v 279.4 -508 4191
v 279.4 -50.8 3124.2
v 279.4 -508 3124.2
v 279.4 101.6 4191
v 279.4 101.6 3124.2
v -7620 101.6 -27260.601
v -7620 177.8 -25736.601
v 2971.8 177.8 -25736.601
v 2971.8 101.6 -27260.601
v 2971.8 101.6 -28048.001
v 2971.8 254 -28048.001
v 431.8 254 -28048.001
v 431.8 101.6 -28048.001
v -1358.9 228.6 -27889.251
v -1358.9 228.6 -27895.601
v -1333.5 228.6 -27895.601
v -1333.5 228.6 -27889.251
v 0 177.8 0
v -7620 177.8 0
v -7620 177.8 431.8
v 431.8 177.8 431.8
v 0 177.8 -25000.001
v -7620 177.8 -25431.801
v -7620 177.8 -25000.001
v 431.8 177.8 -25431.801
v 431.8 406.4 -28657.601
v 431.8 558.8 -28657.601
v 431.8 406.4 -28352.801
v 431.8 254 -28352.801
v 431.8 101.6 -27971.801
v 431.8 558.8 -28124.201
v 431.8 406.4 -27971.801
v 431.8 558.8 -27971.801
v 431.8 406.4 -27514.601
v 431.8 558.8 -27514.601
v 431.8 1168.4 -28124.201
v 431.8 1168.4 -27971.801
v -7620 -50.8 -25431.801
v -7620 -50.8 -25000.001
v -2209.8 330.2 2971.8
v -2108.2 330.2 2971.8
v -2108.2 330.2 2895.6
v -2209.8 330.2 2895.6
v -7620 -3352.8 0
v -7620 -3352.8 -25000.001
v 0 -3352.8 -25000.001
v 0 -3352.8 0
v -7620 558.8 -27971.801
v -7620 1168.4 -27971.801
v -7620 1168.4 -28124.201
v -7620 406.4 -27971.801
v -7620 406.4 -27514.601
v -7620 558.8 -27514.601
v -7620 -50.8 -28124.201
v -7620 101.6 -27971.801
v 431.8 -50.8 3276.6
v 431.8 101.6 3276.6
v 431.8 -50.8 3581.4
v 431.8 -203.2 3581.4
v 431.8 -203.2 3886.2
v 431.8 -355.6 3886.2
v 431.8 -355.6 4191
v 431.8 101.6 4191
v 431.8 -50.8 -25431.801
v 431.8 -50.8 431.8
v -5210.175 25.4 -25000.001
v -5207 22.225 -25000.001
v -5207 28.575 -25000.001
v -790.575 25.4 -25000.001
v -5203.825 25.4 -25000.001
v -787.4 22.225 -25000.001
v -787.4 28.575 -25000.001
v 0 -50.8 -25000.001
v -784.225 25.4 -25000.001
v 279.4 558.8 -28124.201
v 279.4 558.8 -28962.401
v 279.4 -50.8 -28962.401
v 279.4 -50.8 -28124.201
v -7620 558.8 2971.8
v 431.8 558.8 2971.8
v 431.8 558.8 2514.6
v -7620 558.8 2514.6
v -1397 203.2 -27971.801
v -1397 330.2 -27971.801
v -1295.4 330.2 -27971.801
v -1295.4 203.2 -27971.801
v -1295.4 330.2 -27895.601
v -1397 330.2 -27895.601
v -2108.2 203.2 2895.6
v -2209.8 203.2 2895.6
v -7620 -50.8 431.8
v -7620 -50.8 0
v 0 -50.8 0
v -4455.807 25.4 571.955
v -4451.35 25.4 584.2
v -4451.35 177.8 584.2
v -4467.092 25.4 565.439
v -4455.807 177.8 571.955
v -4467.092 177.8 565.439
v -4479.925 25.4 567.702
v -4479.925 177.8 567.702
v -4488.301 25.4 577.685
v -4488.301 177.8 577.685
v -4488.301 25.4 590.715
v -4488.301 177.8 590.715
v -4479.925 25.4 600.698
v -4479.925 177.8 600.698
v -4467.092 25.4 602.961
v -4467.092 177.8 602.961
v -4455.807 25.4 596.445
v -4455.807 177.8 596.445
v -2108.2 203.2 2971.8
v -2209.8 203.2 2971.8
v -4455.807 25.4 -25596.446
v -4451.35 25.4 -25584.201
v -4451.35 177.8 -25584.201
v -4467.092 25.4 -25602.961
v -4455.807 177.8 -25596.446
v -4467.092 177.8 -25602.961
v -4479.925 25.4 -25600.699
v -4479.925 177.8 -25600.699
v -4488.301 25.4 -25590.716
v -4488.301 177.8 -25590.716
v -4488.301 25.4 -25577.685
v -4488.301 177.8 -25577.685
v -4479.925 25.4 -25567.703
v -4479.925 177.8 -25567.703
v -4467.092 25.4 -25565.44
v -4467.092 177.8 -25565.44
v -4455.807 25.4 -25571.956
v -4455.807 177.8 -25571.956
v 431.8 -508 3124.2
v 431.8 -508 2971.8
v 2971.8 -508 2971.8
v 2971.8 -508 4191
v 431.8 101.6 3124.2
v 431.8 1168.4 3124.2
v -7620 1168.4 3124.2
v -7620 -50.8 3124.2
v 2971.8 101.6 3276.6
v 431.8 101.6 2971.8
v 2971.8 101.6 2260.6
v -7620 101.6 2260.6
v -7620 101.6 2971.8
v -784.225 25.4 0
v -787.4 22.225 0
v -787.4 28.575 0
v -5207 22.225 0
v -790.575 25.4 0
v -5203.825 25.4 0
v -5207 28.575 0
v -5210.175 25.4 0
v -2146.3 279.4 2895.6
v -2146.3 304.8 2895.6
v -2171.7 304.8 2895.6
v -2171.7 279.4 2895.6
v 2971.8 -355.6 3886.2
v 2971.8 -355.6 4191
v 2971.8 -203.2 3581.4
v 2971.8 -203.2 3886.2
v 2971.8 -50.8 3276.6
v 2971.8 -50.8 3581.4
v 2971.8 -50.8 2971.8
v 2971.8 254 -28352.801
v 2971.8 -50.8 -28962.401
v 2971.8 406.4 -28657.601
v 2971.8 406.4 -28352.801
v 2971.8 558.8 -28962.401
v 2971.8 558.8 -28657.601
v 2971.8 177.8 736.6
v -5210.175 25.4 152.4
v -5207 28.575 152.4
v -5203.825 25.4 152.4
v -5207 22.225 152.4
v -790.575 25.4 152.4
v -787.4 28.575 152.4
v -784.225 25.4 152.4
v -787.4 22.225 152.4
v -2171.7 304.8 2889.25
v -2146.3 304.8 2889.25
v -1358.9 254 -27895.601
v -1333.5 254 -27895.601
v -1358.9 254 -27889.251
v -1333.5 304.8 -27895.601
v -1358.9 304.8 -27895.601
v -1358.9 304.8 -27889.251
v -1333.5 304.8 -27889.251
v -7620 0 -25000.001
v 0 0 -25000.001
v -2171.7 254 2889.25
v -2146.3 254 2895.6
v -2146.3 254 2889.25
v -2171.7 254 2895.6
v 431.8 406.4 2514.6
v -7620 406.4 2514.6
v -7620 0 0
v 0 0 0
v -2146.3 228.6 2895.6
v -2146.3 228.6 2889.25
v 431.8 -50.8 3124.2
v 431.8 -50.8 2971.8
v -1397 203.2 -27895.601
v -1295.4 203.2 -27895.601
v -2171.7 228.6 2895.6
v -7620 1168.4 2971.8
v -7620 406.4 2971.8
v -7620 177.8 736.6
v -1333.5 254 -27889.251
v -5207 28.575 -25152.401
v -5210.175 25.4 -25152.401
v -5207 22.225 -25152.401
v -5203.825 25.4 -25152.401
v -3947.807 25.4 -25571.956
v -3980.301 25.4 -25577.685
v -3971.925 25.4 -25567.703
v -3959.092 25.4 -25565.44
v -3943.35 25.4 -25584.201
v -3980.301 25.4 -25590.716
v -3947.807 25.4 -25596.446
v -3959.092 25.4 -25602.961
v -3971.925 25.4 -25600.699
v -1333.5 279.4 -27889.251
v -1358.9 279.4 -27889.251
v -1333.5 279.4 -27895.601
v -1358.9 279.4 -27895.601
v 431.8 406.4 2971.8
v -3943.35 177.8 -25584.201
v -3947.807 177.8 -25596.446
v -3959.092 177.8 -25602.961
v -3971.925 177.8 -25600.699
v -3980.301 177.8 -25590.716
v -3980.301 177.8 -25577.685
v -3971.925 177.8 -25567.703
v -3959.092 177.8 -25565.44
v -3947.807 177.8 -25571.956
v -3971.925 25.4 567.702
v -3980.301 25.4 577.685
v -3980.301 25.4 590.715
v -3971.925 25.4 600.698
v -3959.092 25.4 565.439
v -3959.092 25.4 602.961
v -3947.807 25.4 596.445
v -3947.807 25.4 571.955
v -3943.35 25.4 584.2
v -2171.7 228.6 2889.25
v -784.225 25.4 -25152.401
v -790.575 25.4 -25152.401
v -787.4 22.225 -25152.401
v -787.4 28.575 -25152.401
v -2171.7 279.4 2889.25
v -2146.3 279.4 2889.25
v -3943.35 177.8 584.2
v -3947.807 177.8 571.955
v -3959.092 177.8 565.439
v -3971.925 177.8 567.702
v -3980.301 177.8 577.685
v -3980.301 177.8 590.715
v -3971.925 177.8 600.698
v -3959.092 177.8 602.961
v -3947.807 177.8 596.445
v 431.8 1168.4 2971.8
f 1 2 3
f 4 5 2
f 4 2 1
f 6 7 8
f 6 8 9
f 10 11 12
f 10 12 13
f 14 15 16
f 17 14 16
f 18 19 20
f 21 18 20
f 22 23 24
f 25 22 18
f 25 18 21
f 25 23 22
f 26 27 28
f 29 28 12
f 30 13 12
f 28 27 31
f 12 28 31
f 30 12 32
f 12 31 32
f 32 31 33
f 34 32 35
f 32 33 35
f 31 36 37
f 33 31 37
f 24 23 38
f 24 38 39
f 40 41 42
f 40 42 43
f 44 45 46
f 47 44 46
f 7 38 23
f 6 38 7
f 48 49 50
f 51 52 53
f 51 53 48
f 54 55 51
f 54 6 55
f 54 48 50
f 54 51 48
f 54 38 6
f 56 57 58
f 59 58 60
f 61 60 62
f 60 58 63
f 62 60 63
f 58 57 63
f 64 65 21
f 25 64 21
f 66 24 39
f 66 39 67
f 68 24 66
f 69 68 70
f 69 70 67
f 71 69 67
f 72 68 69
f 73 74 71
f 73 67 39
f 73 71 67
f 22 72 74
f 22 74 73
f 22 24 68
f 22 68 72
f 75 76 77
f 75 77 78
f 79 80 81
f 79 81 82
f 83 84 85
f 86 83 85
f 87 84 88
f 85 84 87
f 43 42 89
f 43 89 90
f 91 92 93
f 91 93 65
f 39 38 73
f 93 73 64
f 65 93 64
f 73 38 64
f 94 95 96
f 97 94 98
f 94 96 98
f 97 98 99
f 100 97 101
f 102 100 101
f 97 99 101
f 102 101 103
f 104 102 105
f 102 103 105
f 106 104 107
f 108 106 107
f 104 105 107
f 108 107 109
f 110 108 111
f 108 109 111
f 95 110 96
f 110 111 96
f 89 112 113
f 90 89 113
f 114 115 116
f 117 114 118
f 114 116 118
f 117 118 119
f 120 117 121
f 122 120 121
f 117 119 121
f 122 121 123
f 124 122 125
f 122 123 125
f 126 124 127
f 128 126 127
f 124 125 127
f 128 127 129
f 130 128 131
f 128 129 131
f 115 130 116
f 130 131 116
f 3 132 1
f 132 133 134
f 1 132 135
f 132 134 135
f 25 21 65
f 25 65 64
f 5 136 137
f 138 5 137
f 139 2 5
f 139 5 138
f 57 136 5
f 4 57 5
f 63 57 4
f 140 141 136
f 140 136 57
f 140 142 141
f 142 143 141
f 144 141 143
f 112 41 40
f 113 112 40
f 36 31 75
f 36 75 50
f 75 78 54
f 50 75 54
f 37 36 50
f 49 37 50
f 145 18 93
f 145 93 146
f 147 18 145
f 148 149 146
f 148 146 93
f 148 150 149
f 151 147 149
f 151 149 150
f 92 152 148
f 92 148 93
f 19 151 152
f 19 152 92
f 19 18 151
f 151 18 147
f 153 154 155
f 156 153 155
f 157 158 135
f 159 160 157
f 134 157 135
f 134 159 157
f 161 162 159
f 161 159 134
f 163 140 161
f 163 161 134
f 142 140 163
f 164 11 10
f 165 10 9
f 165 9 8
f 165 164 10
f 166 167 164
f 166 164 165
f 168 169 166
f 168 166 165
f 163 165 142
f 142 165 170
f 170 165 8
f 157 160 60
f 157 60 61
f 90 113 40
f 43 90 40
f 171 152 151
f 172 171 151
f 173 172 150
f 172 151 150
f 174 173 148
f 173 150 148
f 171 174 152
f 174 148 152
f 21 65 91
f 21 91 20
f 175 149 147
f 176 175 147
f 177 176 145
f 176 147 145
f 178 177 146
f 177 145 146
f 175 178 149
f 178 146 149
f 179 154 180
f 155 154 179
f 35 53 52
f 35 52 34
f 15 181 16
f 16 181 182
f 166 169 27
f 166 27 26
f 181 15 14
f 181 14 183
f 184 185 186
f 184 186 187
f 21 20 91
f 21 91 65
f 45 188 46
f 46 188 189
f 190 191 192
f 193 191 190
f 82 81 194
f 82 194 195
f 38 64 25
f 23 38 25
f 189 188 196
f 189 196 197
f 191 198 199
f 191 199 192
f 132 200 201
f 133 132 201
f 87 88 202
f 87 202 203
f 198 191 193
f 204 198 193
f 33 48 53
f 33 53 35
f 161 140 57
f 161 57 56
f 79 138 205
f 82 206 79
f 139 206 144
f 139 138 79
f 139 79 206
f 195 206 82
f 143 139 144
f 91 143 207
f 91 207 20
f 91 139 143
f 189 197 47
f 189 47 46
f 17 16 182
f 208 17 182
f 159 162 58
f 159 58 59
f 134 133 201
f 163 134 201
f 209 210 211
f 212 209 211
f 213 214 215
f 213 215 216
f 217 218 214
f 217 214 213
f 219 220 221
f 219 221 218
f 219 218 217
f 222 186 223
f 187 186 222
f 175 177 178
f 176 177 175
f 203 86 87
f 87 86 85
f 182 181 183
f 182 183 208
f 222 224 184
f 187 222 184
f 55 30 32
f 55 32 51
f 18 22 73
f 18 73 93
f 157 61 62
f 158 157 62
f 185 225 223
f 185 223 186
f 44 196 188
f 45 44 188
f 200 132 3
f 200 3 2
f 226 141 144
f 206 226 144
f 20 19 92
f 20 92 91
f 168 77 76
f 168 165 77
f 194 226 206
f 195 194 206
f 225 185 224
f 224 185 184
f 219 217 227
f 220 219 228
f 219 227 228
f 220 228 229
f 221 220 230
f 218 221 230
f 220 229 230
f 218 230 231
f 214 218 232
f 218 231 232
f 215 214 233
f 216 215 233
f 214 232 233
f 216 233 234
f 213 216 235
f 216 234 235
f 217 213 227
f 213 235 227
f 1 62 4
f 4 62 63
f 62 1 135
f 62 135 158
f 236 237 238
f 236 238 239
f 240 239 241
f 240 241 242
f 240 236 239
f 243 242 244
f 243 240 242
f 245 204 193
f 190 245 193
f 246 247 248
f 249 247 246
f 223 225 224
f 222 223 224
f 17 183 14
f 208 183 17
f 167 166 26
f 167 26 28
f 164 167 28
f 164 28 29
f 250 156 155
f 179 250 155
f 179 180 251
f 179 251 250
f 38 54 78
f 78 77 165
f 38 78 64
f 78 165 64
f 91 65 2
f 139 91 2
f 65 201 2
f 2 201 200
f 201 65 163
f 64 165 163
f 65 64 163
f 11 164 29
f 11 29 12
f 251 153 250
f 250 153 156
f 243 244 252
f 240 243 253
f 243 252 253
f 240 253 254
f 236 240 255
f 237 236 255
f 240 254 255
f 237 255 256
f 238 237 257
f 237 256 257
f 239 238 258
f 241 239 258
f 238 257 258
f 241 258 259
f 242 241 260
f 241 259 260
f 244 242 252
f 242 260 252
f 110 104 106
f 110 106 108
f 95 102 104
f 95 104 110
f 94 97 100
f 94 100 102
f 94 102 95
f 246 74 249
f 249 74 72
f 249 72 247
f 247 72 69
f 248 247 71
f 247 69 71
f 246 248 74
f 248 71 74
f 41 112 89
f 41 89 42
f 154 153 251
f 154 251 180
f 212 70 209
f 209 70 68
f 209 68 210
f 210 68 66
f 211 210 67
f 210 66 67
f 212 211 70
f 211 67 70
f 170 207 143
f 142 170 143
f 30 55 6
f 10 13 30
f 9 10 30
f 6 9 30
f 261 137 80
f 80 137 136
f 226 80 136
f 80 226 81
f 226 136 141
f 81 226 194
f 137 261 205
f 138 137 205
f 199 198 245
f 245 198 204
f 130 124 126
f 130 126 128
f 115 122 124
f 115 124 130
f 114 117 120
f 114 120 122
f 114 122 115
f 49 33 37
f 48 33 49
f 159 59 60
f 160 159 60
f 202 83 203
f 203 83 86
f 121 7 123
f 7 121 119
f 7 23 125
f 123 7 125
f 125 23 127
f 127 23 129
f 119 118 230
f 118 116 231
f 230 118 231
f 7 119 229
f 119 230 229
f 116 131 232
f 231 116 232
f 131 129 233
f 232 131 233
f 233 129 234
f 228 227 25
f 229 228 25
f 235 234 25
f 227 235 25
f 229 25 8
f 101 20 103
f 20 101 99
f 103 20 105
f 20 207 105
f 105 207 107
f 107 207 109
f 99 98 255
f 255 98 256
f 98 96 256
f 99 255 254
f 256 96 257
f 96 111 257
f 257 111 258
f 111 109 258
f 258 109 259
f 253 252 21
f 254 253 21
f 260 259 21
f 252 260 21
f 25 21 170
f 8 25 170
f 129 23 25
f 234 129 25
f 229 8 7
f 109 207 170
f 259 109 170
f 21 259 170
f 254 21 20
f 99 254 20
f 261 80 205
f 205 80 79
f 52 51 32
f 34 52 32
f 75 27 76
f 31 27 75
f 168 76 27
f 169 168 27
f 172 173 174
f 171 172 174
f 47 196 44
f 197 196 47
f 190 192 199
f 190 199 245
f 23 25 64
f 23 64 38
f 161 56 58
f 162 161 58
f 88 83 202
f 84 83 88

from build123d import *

# Parameters (mm, degrees)
SKETCH1_W                         = 7620
SKETCH1_H                         = 25000.0008
POOL_WATER_DEPTH                  = 3352.8
POOL_DECK_SUPPORT_DEPTH           = 101.6
POOL_DECK_SUPPORT_DEPTH_BACK      = 76.2
POOL_DECK_DEPTH                   = 152.4
SKETCH4_W                         = 8051.8
SKETCH4_H                         = 152.4
WALL_DEPTH                        = 1219.2
WALL_2_DEPTH                      = 1219.2
SKETCH7_W                         = 8051.8
SKETCH7_H                         = 152.4
NEAR_SIDE_BENCH_DEPTH             = 457.2
SKETCH8_W                         = 8051.8
SKETCH8_H                         = 152.4
FAR_SIDE_BENCH_DEPTH              = 457.2
STAIRS_DOWN_DEPTH                 = 2540
SLOPED_START                      = -8051.8
SLOPED_POOL_DECK_NEAR_SIDE_DEPTH  = 10591.8
SLOPED_POOL_DECK_FAR_SIDE_DEPTH   = 10591.8
SLOPED_POOL_DECK_LENGTH_DEPTH     = 25863.6008
DRAIN_CORRECTION_DEPTH            = 3455.4
STAIRS_UP_DEPTH                   = 2540
PERIMETER_DRAIN_DEPTH             = 228.6
SKETCH23_R                        = 3.175
FAR_SIDE_SWIM_LANE_EYELETS_DEPTH  = 152.4
SKETCH25_R                        = 3.175
NEAR_SIDE_SWIM_LANE_EYELETS_DEPTH = 152.4
SKETCH26_W                        = 838.2
SKETCH26_H                        = 609.6
FAR_SIDE_STAIRS_WALL_DEPTH        = 152.4
SKETCH27_W                        = 1066.8
SKETCH27_H                        = 609.6
NEAR_SIDE_STAIRS_WALL_DEPTH       = 152.4
SKETCH28_W                        = 101.6
SKETCH28_H                        = 127
FAR_SIDE_ELECTRICAL_BOX_DEPTH     = 76.2
SKETCH29_W                        = 25.4
SKETCH29_H                        = 25.4
FAR_SIDE_OUTLETS_DEPTH            = 6.35
FAR_SIDE_OUTLETS_2_DEPTH          = 6.35
SKETCH30_W                        = 101.6
SKETCH30_H                        = 127
NEAR_SIDE_ELECTRICAL_BOX_DEPTH    = 76.2
SKETCH31_W                        = 25.4
SKETCH31_H                        = 25.4
NEAR_SIDE_OUTLETS_DEPTH           = 6.35
NEAR_SIDE_OUTLETS_2_DEPTH         = 6.35
SKETCH32_R                        = 19.05
CUT_EXTRUDE4_DEPTH                = 152.4


with BuildPart() as part:
    # Sketch1 → Pool Water (new body)
    with BuildSketch(Plane(origin=(0, 0, 0), x_dir=(1, 0, 0), z_dir=(0, 1, 0))):
        with Locations((-3810, 12500.0004)):
            Rectangle(SKETCH1_W, SKETCH1_H)
    extrude(amount=-POOL_WATER_DEPTH)


with BuildPart() as body_2:
    # Sketch2 → Pool Deck Support (new body, two sides)
    with BuildSketch(Plane(origin=(0, 0, 0), x_dir=(1, 0, 0), z_dir=(0, 1, 0))) as pool_deck_support_sk:
        Polygon((-7620, 0), (-7620, -431.8), (431.8, -431.8), (431.8, 25431.8008), (-7620, 25431.8008), (-7620, 25000.0008), (0, 25000.0008), (0, 0), align=None)
    extrude(amount=POOL_DECK_SUPPORT_DEPTH)
    extrude(pool_deck_support_sk.sketch, amount=-POOL_DECK_SUPPORT_DEPTH_BACK)



with BuildPart() as body_3:
    # Sketch3 → Pool Deck (new body)
    with BuildSketch(Plane(origin=(0, 101.6, 0), x_dir=(1, 0, 0), z_dir=(0, 1, 0))):
        Polygon((-7620, -2971.8), (-7620, -431.8), (431.8, -431.8), (431.8, 25431.8008), (-7620, 25431.8008), (-7620, 27971.8008), (2971.8, 27971.8008), (2971.8, -2971.8), align=None)
    extrude(amount=-POOL_DECK_DEPTH)



with BuildPart() as body_4:
    # Sketch4 → Wall (new body)
    with BuildSketch(Plane(origin=(0, -50.8, 0), x_dir=(-1, 0, 0), z_dir=(0, -1, 0))):
        with Locations((3594.1, -3048)):
            Rectangle(SKETCH4_W, SKETCH4_H)
    extrude(amount=-WALL_DEPTH)

    # Sketch7 → Near Side Bench (add)
    with BuildSketch(Plane(origin=(0, 0, 2971.8), x_dir=(-1, 0, 0), z_dir=(0, 0, -1))):
        with Locations((3594.1, 482.6)):
            Rectangle(SKETCH7_W, SKETCH7_H)
    extrude(amount=NEAR_SIDE_BENCH_DEPTH)


with BuildPart() as body_5:
    # Sketch4 → Wall 2 (new body)
    with BuildSketch(Plane(origin=(0, -50.8, 0), x_dir=(-1, 0, 0), z_dir=(0, -1, 0))):
        with Locations((3594.1, 28048.0008)):
            Rectangle(SKETCH4_W, SKETCH4_H)
    extrude(amount=-WALL_2_DEPTH)

    # Sketch8 → Far Side Bench (add)
    with BuildSketch(Plane.XY.offset(-27971.8008)):
        with Locations((-3594.1, 482.6)):
            Rectangle(SKETCH8_W, SKETCH8_H)
    extrude(amount=FAR_SIDE_BENCH_DEPTH)


with BuildPart() as body_3_1:
    add(body_3.part)

    add(body_4.part)  # Stairs Down merges body 4
    # Sketch9 → Stairs Down (add)
    with BuildSketch(Plane(origin=(2971.8, 0, 0), x_dir=(0, 0, -1), z_dir=(1, 0, 0))):
        Polygon((-3276.6, -50.8), (-3581.4, -50.8), (-3581.4, -203.2), (-3886.2, -203.2), (-3886.2, -355.6), (-4191, -355.6), (-4191, -508), (-4160.29065508, -508), (-2971.8, -508), (-2971.8, -291.946336827), (-2971.8, 101.6), (-3276.6, 101.6), align=None)
    extrude(amount=-STAIRS_DOWN_DEPTH)


with BuildPart() as body_2_1:
    add(body_2.part)

    add(body_3_1.part)  # Sloped Pool Deck Near Side merges body 3
    # Sketch14 → Sloped Pool Deck Near Side (add)
    with BuildSketch(Plane(origin=(431.8, 0, 0), x_dir=(0, 0, -1), z_dir=(1, 0, 0)).offset(SLOPED_START)):
        Polygon((-431.8, 101.6), (-431.8, 177.8), (-736.6, 177.8), (-2260.6, 101.6), align=None)
    extrude(amount=SLOPED_POOL_DECK_NEAR_SIDE_DEPTH)

    # Sketch17 → Sloped Pool Deck Far Side (add)
    with BuildSketch(Plane.ZY.offset(7620)):
        Polygon((-25431.8008, 101.6), (-25431.8008, 177.8), (-25736.6008, 177.8), (-27260.6008, 101.6), align=None)
    extrude(amount=-SLOPED_POOL_DECK_FAR_SIDE_DEPTH)

    # Sketch15 → Sloped Pool Deck Length (add)
    with BuildSketch(Plane(origin=(0, 0, 431.8), x_dir=(-1, 0, 0), z_dir=(0, 0, -1))):
        Polygon((-431.8, 101.6), (-431.8, 177.8), (-1346.2, 177.8), (-2971.8, 177.8), (-2971.8, 101.6), (-2260.6, 101.6), (-1346.2, 101.6), align=None)
    extrude(amount=SLOPED_POOL_DECK_LENGTH_DEPTH)

    # Sketch19 → Drain Correction (cut, through all)
    with BuildSketch(Plane(origin=(0, 101.6, 0), x_dir=(1, 0, 0), z_dir=(0, 1, 0))):
        Polygon((-7620, 0), (-7620, -431.8), (431.8, -431.8), (431.8, 25431.8008), (-7620, 25431.8008), (-7620, 25000.0008), (0, 25000.0008), (0, 0), align=None)
    extrude(amount=-DRAIN_CORRECTION_DEPTH, mode=Mode.SUBTRACT)


    add(body_5.part)  # Stairs Up merges body 5
    # Sketch21 → Stairs Up (add)
    with BuildSketch(Plane(origin=(2971.8, 0, 0), x_dir=(0, 0, -1), z_dir=(1, 0, 0))):
        Polygon((28657.6008, 406.4), (28352.8008, 406.4), (28352.8008, 254), (28048.0008, 254), (28048.0008, 101.6), (27743.2008, 101.6), (27743.2008, -50.8), (28962.4008, -50.8), (28962.4008, 558.8), (28657.6008, 558.8), align=None)
    extrude(amount=-STAIRS_UP_DEPTH)

    # Sketch26 → Far Side Stairs Wall (add)
    with BuildSketch(Plane.ZY.offset(-431.8)):
        with Locations((-28543.3008, 254)):
            Rectangle(SKETCH26_W, SKETCH26_H)
    extrude(amount=FAR_SIDE_STAIRS_WALL_DEPTH)

    # Sketch27 → Near Side Stairs Wall (add)
    with BuildSketch(Plane.ZY.offset(-431.8)):
        with Locations((3657.6, -203.2)):
            Rectangle(SKETCH27_W, SKETCH27_H)
    extrude(amount=NEAR_SIDE_STAIRS_WALL_DEPTH)

    # Sketch32 → Cut-Extrude4 (cut)
    with BuildSketch(Plane(origin=(0, 177.8, 0), x_dir=(1, 0, 0), z_dir=(0, 1, 0))):
        with Locations((-4470.4, -584.2)):
            Circle(SKETCH32_R)
        with Locations((-3962.4, -584.2)):
            Circle(SKETCH32_R)
        with Locations((-4470.4, 25584.2008)):
            Circle(SKETCH32_R)
        with Locations((-3962.4, 25584.2008)):
            Circle(SKETCH32_R)
    extrude(amount=-CUT_EXTRUDE4_DEPTH, mode=Mode.SUBTRACT)


with BuildPart() as body_3_2:
    # Sketch20 → Perimeter Drain (new body)
    with BuildSketch(Plane(origin=(0, 177.8, 0), x_dir=(1, 0, 0), z_dir=(0, 1, 0))):
        Polygon((-7620, 0), (-7620, -431.8), (431.8, -431.8), (431.8, 25431.8008), (-7620, 25431.8008), (-7620, 25000.0008), (0, 25000.0008), (0, 0), align=None)
    extrude(amount=-PERIMETER_DRAIN_DEPTH)

    # Sketch23 → Far Side Swim Lane Eyelets (cut)
    with BuildSketch(Plane.XY.offset(-25000.0008)):
        with Locations((-5207, 25.4)):
            Circle(SKETCH23_R)
        with Locations((-787.4, 25.4)):
            Circle(SKETCH23_R)
    extrude(amount=-FAR_SIDE_SWIM_LANE_EYELETS_DEPTH, mode=Mode.SUBTRACT)

    # Sketch25 → Near Side Swim Lane Eyelets (cut)
    with BuildSketch(Plane(origin=(0, 0, 0), x_dir=(-1, 0, 0), z_dir=(0, 0, -1))):
        with Locations((787.4, 25.4)):
            Circle(SKETCH25_R)
        with Locations((5207, 25.4)):
            Circle(SKETCH25_R)
    extrude(amount=-NEAR_SIDE_SWIM_LANE_EYELETS_DEPTH, mode=Mode.SUBTRACT)


with BuildPart() as body_4_2:
    # Sketch28 → Far Side Electrical Box (new body)
    with BuildSketch(Plane.XY.offset(-27971.8008)):
        with Locations((-1346.2, 266.7)):
            Rectangle(SKETCH28_W, SKETCH28_H)
    extrude(amount=FAR_SIDE_ELECTRICAL_BOX_DEPTH)


with BuildPart() as body_5_2:
    # Sketch29 → Far Side Outlets (new body)
    with BuildSketch(Plane.XY.offset(-27895.6008)):
        with Locations((-1346.2, 292.1)):
            Rectangle(SKETCH29_W, SKETCH29_H)
    extrude(amount=FAR_SIDE_OUTLETS_DEPTH)


with BuildPart() as body_6:
    # Sketch29 → Far Side Outlets 2 (new body)
    with BuildSketch(Plane.XY.offset(-27895.6008)):
        with Locations((-1346.2, 241.3)):
            Rectangle(SKETCH29_W, SKETCH29_H)
    extrude(amount=FAR_SIDE_OUTLETS_2_DEPTH)


with BuildPart() as body_7:
    # Sketch30 → Near Side Electrical Box (new body)
    with BuildSketch(Plane(origin=(0, 0, 2971.8), x_dir=(-1, 0, 0), z_dir=(0, 0, -1))):
        with Locations((2159, 266.7)):
            Rectangle(SKETCH30_W, SKETCH30_H)
    extrude(amount=NEAR_SIDE_ELECTRICAL_BOX_DEPTH)


with BuildPart() as body_8:
    # Sketch31 → Near Side Outlets (new body)
    with BuildSketch(Plane(origin=(0, 0, 2895.6), x_dir=(-1, 0, 0), z_dir=(0, 0, -1))):
        with Locations((2159, 292.1)):
            Rectangle(SKETCH31_W, SKETCH31_H)
    extrude(amount=NEAR_SIDE_OUTLETS_DEPTH)


with BuildPart() as body_9:
    # Sketch31 → Near Side Outlets 2 (new body)
    with BuildSketch(Plane(origin=(0, 0, 2895.6), x_dir=(-1, 0, 0), z_dir=(0, 0, -1))):
        with Locations((2159, 241.3)):
            Rectangle(SKETCH31_W, SKETCH31_H)
    extrude(amount=NEAR_SIDE_OUTLETS_2_DEPTH)


solid = Compound([part.part, body_2_1.part, body_3_2.part, body_4_2.part, body_5_2.part, body_6.part, body_7.part, body_8.part, body_9.part])
